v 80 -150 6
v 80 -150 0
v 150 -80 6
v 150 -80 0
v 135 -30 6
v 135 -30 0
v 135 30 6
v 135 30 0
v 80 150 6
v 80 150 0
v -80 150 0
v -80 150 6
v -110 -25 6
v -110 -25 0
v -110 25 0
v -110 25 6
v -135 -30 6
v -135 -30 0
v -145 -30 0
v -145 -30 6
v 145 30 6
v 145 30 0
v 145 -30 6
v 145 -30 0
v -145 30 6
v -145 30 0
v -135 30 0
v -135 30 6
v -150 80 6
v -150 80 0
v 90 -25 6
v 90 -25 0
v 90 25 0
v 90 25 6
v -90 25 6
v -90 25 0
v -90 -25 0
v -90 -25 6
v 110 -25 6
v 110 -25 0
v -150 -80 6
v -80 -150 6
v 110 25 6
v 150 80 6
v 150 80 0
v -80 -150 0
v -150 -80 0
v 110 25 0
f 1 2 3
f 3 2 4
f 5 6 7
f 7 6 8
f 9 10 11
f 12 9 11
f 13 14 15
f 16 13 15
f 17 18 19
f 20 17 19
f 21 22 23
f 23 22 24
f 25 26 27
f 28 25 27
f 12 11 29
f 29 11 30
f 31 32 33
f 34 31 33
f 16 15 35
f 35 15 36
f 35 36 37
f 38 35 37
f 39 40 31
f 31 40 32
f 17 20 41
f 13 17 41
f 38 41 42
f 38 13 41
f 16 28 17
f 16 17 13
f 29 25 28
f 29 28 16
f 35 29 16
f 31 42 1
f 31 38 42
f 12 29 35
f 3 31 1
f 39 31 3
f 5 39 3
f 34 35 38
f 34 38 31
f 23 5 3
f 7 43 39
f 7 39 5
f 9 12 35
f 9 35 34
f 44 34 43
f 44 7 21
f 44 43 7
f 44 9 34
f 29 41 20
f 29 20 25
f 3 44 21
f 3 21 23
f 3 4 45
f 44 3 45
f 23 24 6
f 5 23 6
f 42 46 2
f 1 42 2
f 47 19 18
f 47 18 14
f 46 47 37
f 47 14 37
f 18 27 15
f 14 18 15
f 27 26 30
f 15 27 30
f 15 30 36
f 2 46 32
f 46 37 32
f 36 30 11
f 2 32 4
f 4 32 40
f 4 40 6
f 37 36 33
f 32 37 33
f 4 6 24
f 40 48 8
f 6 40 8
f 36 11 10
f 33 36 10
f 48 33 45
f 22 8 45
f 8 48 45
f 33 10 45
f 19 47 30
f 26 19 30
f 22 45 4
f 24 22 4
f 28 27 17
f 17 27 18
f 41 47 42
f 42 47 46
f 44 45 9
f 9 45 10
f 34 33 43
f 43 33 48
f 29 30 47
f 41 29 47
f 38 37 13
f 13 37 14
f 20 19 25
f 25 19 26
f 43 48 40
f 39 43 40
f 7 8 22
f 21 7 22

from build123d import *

# Parameters (mm, degrees)
F1_DEPTH = 6


with BuildPart() as f1:
    # F0 (on Top) → F1 (new body)
    with BuildSketch(Plane.XY):
        Polygon((80, 150), (0, 150), (0, 0), (90, 0), (90, 25), (110, 25), (110, 0), (135, 0), (135, 30), (145, 30), (145, 0), (150, 0), (150, 80), align=None)
        Polygon((0, 150), (-80, 150), (-150, 80), (-150, 0), (-145, 0), (-145, 30), (-135, 30), (-135, 0), (-110, 0), (-110, 25), (-90, 25), (-90, 0), (0, 0), align=None)
        Polygon((-145, 0), (-150, 0), (-150, -80), (-80, -150), (0, -150), (0, 0), (-90, 0), (-90, -25), (-110, -25), (-110, 0), (-135, 0), (-135, -30), (-145, -30), align=None)
        Polygon((90, 0), (0, 0), (0, -150), (80, -150), (150, -80), (150, 0), (145, 0), (145, -30), (135, -30), (135, 0), (110, 0), (110, -25), (90, -25), align=None)
    extrude(amount=F1_DEPTH)


solid = f1.part
